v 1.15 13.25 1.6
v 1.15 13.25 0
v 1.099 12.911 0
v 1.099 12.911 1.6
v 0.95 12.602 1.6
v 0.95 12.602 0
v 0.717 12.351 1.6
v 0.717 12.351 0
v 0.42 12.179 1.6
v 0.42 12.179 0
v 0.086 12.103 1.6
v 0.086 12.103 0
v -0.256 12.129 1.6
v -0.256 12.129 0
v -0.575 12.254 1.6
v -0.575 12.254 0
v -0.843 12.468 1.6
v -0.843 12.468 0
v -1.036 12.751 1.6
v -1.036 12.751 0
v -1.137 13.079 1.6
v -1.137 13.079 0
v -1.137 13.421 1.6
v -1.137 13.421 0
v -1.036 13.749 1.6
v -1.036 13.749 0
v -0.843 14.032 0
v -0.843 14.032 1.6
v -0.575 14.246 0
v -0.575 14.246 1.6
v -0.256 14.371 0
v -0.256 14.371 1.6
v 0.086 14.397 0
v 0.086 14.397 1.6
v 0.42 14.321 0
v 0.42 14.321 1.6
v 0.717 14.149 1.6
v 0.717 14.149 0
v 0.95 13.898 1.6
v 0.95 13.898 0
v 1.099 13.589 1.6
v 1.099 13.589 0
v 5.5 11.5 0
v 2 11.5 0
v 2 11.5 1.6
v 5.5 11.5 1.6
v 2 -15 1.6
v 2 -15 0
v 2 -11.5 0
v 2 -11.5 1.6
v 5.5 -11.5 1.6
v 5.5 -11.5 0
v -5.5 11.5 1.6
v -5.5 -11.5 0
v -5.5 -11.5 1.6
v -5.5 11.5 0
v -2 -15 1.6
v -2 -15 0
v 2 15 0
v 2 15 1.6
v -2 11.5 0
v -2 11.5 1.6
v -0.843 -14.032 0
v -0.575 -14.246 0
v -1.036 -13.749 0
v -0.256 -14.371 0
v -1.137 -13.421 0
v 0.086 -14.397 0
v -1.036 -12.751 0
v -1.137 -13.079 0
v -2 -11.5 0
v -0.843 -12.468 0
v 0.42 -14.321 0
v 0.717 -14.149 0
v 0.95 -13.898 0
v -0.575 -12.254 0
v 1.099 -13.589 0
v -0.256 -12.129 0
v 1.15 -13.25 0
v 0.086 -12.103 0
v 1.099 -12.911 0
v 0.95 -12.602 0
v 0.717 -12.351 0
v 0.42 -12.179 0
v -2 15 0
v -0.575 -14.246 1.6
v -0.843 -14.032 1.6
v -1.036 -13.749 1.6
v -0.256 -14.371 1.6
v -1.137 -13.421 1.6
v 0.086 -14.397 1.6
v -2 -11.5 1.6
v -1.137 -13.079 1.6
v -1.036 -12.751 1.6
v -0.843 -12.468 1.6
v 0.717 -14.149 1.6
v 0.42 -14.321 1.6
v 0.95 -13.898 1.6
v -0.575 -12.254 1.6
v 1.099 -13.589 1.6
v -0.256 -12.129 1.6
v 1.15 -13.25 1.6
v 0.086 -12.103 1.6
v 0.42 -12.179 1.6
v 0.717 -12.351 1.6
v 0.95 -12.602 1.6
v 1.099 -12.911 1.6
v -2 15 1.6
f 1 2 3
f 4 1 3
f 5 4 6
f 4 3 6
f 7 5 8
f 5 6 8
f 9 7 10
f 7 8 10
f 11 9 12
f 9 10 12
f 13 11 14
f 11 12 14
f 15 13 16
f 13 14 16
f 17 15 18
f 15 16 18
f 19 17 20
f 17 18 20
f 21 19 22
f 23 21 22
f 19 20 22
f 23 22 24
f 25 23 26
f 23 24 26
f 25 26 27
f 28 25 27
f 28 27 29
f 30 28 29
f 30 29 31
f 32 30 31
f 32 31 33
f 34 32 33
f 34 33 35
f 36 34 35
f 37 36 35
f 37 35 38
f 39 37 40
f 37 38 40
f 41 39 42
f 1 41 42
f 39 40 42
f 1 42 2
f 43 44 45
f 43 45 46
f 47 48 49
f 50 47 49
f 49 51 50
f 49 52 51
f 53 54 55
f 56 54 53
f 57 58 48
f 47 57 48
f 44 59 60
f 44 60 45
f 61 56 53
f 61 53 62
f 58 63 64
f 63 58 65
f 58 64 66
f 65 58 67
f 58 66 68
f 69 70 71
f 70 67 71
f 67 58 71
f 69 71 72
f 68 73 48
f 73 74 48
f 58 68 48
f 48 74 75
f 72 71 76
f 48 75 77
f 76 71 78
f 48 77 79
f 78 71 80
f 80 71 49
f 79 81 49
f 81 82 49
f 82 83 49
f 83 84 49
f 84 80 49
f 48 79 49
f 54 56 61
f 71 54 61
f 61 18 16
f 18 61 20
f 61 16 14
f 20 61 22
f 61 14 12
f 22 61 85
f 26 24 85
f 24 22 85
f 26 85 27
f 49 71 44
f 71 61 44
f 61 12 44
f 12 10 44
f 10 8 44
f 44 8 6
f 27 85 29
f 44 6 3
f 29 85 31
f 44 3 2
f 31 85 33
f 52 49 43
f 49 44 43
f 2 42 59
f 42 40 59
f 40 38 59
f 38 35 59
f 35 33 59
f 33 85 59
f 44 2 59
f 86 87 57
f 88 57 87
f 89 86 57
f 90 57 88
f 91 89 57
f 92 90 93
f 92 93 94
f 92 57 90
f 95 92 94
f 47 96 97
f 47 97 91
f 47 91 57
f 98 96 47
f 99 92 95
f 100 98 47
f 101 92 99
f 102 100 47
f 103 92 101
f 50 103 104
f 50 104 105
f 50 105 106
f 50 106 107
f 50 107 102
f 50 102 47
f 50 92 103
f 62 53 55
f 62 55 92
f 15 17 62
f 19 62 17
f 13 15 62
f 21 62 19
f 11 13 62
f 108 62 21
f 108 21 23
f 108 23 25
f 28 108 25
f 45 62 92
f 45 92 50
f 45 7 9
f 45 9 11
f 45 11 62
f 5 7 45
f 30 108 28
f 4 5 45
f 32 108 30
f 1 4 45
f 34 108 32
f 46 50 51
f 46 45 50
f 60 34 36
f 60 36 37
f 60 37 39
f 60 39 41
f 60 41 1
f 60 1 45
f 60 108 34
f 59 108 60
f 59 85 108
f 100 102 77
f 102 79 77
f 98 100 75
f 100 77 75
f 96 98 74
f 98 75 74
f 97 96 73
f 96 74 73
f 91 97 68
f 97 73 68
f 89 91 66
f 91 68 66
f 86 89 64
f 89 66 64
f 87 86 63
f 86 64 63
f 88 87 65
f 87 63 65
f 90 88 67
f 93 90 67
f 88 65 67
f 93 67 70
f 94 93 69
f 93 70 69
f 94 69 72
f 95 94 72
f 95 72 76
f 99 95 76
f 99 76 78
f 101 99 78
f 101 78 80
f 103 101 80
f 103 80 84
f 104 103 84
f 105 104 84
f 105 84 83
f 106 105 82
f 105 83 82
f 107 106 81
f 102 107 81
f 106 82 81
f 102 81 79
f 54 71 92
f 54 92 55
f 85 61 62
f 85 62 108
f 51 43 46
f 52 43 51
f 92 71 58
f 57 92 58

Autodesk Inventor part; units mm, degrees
ref_plane "YZ Plane" through (0, 0, 0) normal (1, 0, 0) x (0, 1, 0)
ref_plane "XZ Plane" through (0, 0, 0) normal (0, 1, 0) x (-1, 0, 0)
ref_plane "XY Plane" through (0, 0, 0) normal (0, 0, 1) x (1, 0, 0)
ref_plane "作業平面1" through (0, 0, 0) normal (0, 0, 1) x (1, 0, 0)
sketch "スケッチ1" plane through (0, 0, 0) normal (0, 0, 1) x (1, 0, 0)
  line L0 (5.5, -11.5) -> (-5.5, -11.5) projected
  line L1 (5.5, 11.5) -> (5.5, -11.5) projected
  line L2 (-5.5, 11.5) -> (5.5, 11.5) projected
  line L3 (-5.5, -11.5) -> (-5.5, 11.5) projected
  line L4 (2, 11.5) -> (-2, 11.5)
  line L5 (-2, 11.5) -> (-2, 15)
  line L6 (-2, 15) -> (2, 15)
  line L7 (2, 15) -> (2, 11.5)
  line L8 (2, -11.5) -> (-2, -11.5)
  line L9 (-2, -11.5) -> (-2, -15)
  line L10 (-2, -15) -> (2, -15)
  line L11 (2, -15) -> (2, -11.5)
  line L12 (0, -21) -> (0, 21) projected
  circle A0 centre (0, 13.25) radius 1.15
  circle A1 centre (0, -13.25) radius 1.15
  line L13 (2, 13.25) -> (-2, 13.25) construction
  line L14 (2, -13.25) -> (-2, -13.25) construction
  point P0 (0, 0)
  point P1 (0, 15)
  dimension "d0" = 3.5
  dimension "d1" = 4
  dimension "d2" = 2.3
extrude "押し出し1" add sketch "スケッチ1" along normal blind 1.6 contours L0 L12 L2 L1 | L11 L10 L12 A1 L0 | L12 A1 L10 L9 L0 | L0 L3 L2 L12 | L2 L12 A0 L6 L7 | L2 L5 L6 L12 A0
properties part number "Segment_PCB"
